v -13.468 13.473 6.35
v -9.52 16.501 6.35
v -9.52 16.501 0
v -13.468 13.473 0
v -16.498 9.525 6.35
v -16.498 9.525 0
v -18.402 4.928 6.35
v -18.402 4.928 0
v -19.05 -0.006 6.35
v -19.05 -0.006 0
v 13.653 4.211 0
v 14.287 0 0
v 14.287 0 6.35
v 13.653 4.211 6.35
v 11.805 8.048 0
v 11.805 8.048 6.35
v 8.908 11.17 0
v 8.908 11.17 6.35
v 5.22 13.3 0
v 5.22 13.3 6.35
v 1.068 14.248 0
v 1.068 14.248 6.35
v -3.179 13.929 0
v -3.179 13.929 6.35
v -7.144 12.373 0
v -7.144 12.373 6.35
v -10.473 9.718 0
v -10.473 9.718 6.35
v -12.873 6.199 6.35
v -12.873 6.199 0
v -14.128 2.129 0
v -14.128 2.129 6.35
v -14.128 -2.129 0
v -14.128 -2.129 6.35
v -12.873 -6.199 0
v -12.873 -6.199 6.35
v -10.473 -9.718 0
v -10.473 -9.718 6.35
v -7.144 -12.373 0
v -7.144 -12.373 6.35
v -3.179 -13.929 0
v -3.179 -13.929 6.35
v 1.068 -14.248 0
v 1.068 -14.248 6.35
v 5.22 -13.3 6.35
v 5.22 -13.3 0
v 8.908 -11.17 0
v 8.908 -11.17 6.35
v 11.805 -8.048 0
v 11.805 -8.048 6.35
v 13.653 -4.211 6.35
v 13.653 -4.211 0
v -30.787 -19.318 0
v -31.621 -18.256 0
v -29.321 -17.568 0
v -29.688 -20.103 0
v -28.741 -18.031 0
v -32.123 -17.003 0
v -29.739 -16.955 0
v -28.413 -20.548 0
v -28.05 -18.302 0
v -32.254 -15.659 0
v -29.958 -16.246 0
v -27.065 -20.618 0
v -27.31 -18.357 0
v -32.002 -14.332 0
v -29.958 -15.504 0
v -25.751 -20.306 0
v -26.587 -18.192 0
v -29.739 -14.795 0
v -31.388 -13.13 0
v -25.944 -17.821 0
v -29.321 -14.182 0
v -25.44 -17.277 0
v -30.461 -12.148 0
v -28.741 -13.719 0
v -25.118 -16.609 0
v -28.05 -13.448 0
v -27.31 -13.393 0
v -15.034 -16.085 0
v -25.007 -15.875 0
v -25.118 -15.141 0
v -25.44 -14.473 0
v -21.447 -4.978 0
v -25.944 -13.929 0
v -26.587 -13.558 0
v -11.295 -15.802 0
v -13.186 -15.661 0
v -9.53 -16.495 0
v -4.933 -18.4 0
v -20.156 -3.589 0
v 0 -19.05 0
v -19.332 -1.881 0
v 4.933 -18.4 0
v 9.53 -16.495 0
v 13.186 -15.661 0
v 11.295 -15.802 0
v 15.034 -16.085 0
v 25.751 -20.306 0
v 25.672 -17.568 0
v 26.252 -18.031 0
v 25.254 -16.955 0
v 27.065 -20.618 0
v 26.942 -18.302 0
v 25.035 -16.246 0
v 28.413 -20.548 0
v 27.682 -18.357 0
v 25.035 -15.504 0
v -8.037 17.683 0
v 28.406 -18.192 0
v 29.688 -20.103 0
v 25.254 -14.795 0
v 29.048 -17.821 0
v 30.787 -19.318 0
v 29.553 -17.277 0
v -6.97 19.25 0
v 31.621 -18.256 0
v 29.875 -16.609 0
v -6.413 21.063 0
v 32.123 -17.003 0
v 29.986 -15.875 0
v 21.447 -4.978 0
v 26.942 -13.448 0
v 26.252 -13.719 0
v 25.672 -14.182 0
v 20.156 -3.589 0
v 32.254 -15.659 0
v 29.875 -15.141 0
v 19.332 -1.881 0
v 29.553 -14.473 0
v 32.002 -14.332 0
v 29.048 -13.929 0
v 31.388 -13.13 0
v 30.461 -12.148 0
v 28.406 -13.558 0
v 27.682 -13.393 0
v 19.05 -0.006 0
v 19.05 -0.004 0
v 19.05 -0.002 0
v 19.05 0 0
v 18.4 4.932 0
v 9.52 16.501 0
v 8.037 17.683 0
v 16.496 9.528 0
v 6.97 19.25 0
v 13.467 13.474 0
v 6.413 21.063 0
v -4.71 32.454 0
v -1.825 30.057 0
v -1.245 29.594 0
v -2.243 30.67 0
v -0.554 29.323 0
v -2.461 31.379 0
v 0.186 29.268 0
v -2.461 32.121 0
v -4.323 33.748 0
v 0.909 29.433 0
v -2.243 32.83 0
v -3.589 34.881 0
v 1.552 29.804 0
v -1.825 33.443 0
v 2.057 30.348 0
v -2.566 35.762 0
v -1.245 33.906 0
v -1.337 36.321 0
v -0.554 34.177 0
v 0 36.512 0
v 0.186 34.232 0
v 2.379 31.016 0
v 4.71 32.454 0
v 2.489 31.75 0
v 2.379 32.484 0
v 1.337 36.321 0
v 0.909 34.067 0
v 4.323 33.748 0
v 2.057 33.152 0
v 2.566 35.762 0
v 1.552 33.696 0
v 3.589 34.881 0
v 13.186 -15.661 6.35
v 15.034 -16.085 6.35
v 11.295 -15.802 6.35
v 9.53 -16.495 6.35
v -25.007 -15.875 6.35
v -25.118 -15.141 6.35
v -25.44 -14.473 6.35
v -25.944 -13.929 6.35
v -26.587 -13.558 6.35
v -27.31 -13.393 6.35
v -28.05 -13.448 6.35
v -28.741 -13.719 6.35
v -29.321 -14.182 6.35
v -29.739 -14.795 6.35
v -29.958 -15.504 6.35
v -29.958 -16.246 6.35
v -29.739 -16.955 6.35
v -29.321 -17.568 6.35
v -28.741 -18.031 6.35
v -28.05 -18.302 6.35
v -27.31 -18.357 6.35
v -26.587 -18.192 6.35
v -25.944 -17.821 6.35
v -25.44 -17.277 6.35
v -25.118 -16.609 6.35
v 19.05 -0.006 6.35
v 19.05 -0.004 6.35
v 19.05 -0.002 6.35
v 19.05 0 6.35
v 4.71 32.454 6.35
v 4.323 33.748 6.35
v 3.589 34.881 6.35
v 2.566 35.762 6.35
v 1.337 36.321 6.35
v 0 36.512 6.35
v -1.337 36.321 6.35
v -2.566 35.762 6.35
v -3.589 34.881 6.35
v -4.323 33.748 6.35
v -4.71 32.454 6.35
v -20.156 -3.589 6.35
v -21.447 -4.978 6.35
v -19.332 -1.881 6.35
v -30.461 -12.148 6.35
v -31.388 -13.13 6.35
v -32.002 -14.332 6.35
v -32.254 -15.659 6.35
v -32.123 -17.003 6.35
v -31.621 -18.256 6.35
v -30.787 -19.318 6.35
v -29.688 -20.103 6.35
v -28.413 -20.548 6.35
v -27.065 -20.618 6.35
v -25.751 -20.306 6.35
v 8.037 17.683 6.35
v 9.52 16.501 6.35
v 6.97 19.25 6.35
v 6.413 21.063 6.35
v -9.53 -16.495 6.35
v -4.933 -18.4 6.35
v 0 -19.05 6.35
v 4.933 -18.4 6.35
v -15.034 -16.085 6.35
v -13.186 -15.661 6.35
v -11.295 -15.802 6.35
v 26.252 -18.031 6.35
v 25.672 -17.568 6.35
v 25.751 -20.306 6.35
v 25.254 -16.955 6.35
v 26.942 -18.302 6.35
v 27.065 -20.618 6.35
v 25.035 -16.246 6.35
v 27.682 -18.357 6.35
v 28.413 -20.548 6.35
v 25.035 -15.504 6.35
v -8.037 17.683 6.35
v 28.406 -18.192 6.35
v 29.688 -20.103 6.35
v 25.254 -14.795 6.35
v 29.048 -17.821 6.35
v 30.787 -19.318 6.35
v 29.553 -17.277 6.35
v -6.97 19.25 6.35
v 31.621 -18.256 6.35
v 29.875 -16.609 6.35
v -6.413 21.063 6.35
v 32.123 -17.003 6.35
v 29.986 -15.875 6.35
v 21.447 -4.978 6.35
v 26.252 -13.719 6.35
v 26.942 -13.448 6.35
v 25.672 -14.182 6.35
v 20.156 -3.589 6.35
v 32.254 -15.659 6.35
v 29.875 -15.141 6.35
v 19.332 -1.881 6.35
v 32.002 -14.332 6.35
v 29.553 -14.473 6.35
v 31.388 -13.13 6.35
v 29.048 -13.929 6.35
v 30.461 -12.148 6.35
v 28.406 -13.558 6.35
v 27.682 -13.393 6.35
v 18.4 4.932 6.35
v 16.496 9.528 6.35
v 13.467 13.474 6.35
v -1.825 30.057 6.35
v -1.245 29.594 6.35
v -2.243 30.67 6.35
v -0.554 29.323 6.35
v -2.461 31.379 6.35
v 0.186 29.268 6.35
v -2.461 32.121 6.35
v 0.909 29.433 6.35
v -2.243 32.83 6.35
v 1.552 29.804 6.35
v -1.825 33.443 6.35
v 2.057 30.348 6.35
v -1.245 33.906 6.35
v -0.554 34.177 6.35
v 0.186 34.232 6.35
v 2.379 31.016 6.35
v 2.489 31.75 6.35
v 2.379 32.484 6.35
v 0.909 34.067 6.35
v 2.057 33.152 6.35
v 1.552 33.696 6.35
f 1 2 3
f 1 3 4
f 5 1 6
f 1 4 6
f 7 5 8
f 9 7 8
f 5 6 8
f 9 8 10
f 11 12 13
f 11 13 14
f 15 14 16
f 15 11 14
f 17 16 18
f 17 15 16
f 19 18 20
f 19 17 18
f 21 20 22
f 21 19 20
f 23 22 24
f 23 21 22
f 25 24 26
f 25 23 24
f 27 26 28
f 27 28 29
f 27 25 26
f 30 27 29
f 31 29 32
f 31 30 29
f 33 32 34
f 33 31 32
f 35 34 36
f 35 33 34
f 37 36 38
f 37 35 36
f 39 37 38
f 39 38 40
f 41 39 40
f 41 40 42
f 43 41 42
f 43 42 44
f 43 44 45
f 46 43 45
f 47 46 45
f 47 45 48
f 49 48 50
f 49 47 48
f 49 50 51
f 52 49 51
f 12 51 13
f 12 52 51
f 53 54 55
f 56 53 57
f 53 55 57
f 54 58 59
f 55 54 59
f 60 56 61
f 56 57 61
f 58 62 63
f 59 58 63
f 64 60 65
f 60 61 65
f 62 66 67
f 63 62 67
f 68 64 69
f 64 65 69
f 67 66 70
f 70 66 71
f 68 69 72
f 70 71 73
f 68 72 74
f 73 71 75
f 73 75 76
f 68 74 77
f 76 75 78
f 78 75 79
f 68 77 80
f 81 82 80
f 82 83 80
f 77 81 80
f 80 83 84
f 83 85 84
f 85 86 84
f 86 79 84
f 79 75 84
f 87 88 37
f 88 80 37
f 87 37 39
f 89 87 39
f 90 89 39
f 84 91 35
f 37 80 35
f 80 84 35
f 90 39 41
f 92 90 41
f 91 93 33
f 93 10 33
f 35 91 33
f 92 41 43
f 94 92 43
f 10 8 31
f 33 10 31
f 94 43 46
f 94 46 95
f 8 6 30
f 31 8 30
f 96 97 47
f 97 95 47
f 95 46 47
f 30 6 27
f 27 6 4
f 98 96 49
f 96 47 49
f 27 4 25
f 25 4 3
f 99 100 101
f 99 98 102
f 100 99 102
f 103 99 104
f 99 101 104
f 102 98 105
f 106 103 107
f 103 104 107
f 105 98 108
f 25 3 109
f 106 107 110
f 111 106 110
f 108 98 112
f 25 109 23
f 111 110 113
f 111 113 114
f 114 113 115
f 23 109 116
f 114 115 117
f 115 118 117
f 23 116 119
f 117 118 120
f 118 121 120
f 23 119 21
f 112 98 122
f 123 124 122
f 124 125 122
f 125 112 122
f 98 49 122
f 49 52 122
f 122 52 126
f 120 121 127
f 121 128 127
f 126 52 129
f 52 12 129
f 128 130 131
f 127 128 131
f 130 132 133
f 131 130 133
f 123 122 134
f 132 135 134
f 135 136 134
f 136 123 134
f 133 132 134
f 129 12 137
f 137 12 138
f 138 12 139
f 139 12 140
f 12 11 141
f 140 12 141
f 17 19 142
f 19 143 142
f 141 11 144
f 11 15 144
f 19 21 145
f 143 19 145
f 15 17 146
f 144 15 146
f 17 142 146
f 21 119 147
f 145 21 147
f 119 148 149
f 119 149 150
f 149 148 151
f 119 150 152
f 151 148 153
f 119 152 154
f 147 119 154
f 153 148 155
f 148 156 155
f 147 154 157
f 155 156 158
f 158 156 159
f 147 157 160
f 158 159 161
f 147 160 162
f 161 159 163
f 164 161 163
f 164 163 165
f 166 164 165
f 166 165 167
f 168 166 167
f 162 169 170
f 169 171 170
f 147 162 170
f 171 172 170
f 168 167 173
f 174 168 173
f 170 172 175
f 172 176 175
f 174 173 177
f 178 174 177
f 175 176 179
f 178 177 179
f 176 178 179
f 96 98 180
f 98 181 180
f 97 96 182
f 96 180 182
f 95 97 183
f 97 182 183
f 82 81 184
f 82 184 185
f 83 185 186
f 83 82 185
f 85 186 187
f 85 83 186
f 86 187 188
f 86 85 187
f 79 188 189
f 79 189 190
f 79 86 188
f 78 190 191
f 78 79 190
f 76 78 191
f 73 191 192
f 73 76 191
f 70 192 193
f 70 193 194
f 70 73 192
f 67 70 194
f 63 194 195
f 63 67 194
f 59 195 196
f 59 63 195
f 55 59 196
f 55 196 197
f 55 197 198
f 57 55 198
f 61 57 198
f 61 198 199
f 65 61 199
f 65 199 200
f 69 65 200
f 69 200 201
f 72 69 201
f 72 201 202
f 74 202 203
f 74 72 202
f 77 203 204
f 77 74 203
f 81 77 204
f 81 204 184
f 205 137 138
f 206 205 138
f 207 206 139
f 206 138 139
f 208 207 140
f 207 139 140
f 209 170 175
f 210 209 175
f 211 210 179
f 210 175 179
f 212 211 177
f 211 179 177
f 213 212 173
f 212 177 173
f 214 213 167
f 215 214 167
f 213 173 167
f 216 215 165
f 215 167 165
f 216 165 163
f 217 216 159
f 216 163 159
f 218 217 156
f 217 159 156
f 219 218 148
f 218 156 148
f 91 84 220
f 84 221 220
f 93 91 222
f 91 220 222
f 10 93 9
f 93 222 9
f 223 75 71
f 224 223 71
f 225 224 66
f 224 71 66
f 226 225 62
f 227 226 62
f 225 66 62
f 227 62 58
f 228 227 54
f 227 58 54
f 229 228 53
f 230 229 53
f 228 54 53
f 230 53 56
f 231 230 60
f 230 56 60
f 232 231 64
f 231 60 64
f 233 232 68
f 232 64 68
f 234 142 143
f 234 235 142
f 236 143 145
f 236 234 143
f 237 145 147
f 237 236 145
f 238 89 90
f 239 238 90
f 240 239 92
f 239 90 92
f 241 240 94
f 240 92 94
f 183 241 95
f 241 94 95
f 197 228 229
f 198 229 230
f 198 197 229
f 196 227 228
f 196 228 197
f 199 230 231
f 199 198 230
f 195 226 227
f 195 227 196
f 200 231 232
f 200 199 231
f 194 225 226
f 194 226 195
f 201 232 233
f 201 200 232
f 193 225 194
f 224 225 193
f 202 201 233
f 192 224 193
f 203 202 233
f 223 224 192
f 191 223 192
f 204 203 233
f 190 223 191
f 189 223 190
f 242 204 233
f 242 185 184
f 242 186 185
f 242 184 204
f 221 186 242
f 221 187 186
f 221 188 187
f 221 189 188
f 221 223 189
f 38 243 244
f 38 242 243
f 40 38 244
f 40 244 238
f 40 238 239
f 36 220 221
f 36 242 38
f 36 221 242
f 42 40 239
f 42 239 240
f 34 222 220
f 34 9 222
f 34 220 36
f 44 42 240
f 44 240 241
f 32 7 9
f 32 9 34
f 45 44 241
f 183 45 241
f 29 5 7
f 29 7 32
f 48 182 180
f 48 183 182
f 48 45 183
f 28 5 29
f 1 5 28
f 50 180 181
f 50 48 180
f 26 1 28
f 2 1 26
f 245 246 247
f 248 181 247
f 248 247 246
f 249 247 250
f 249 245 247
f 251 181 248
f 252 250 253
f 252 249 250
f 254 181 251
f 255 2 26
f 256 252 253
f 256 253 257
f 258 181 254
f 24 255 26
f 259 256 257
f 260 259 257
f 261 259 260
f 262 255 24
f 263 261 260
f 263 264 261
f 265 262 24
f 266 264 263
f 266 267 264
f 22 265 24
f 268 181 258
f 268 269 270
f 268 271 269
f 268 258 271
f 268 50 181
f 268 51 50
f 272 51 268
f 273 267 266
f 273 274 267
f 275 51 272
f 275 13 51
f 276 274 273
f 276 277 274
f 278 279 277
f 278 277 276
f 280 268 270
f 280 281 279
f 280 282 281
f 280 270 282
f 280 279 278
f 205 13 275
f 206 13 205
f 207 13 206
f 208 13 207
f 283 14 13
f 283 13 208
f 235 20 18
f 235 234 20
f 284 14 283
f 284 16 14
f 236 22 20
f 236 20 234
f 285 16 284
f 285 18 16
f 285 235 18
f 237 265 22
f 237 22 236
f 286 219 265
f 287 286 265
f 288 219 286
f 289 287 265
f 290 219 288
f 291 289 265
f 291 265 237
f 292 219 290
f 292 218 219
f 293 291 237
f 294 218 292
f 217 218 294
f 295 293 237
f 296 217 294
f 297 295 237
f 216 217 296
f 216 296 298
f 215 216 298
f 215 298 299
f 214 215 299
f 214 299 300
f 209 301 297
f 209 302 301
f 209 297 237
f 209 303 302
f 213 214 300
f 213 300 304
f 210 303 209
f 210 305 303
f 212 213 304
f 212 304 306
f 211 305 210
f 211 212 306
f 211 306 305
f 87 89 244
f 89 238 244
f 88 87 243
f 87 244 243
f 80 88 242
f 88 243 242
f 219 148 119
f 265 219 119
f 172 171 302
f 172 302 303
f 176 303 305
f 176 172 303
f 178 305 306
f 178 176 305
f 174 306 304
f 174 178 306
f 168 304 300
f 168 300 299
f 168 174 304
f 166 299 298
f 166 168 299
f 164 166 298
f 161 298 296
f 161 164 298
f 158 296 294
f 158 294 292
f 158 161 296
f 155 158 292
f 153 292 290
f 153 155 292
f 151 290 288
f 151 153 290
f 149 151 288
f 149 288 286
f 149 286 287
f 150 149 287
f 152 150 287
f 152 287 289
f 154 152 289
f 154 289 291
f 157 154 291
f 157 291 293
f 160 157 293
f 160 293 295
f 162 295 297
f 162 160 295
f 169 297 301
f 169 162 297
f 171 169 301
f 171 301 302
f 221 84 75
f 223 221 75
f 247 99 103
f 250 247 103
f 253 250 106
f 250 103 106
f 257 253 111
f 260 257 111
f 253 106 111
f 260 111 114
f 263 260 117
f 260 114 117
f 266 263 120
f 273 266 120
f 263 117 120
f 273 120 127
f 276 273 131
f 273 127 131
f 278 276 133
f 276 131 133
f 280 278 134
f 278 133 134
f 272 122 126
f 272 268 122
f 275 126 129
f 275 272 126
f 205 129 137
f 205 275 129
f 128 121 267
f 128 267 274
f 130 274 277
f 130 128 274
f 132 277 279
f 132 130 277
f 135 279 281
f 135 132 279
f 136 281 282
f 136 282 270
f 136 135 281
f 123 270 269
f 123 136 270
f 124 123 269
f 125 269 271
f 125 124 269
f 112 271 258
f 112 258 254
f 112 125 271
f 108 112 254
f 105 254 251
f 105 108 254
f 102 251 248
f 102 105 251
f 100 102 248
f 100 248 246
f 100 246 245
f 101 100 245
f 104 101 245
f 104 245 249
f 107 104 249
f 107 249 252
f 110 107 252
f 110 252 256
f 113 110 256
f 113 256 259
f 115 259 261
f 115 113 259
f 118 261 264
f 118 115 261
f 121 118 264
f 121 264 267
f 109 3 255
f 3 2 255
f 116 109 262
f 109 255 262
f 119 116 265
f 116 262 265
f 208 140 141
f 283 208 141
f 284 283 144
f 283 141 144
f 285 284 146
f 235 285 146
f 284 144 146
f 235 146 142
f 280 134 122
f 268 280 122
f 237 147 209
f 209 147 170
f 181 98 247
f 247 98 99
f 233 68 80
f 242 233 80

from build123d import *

# Parameters (mm, degrees)
SKETCH2_R           = 19.05
SKETCH2_R_2         = 14.2875
SKETCH2_R_3         = 4.7625
SKETCH2_R_4         = 2.4892
BOSS_EXTRUDE1_DEPTH = 6.35
FILLET2_R           = 6.35


with BuildPart() as part:
    # Sketch2 → Boss-Extrude1 (new body)
    # profile 1 of 10: a face of its own
    with BuildSketch(Plane.XY):
        Circle(SKETCH2_R)
        Circle(SKETCH2_R_2, mode=Mode.SUBTRACT)
    # profile 2 of 10: a face of its own
    with BuildSketch(Plane.XY):
        with BuildLine():
            Line((30.461032527, -12.147828653), (18.828728894, -2.89507655))
            ThreePointArc((18.828728894, -2.89507655), (16.497783942, -9.525), (11.921574285, -14.858619268))
            Line((11.921574285, -14.858619268), (25.750844478, -20.306113668))
            ThreePointArc((25.750844478, -20.306113668), (23.371860585, -13.49375), (30.461032527, -12.147828653))
        make_face()
    # profile 3 of 10: a face of its own
    with BuildSketch(Plane.XY):
        with BuildLine():
            ThreePointArc((4.7625, 31.75), (-0.352941685, 27.000595993), (-4.710188049, 32.453942321))
            Line((-4.710188049, 32.453942321), (-6.907154609, 17.753695818))
            ThreePointArc((-6.907154609, 17.753695818), (0, 19.05), (6.907154609, 17.753695818))
            Line((6.907154609, 17.753695818), (4.710188049, 32.453942321))
            ThreePointArc((4.710188049, 32.453942321), (4.749404007, 32.102941685), (4.7625, 31.75))
        make_face()
    # profile 4 of 10: a face of its own
    with BuildSketch(Plane.XY):
        with BuildLine():
            ThreePointArc((-11.921574285, -14.858619268), (-16.497783942, -9.525), (-18.828728894, -2.89507655))
            Line((-18.828728894, -2.89507655), (-30.461032527, -12.147828653))
            ThreePointArc((-30.461032527, -12.147828653), (-25.427261032, -11.585424635), (-22.73380657, -15.875))
            ThreePointArc((-22.73380657, -15.875), (-23.55967289, -18.555358468), (-25.750844478, -20.306113668))
            Line((-25.750844478, -20.306113668), (-11.921574285, -14.858619268))
        make_face()
    # profile 5 of 10: a face of its own
    with BuildSketch(Plane.XY):
        with Locations((-27.49630657, -15.875)):
            Circle(SKETCH2_R_3)
        with Locations((-27.49630657, -15.875)):
            Circle(SKETCH2_R_4, mode=Mode.SUBTRACT)
    # profile 6 of 10: a face of its own
    with BuildSketch(Plane.XY):
        with Locations((27.49630657, -15.875)):
            Circle(SKETCH2_R_3)
        with Locations((27.49630657, -15.875)):
            Circle(SKETCH2_R_4, mode=Mode.SUBTRACT)
    # profile 7 of 10: a face of its own
    with BuildSketch(Plane.XY):
        with Locations((0, 31.75)):
            Circle(SKETCH2_R_3)
        with Locations((0, 31.75)):
            Circle(SKETCH2_R_4, mode=Mode.SUBTRACT)
    # profile 8 of 10: a face of its own
    with BuildSketch(Plane.XY):
        with BuildLine():
            ThreePointArc((6.907154609, 17.753695818), (0, 19.05), (-6.907154609, 17.753695818))
            ThreePointArc((-6.907154609, 17.753695818), (-16.497783942, 9.525), (-18.828728894, -2.89507655))
            ThreePointArc((-18.828728894, -2.89507655), (-16.497783942, -9.525), (-11.921574285, -14.858619268))
            ThreePointArc((-11.921574285, -14.858619268), (0, -19.05), (11.921574285, -14.858619268))
            ThreePointArc((11.921574285, -14.858619268), (16.497783942, -9.525), (18.828728894, -2.89507655))
            ThreePointArc((18.828728894, -2.89507655), (18.994601673, -1.451760064), (19.05, 0))
            ThreePointArc((19.05, 0), (15.723927552, 10.754561932), (6.907154609, 17.753695818))
        make_face()
        Circle(SKETCH2_R_2, mode=Mode.SUBTRACT)
    # profile 9 of 10: a face of its own
    with BuildSketch(Plane.XY):
        with BuildLine():
            ThreePointArc((6.907154609, 17.753695818), (0, 19.05), (-6.907154609, 17.753695818))
            ThreePointArc((-6.907154609, 17.753695818), (-16.497783942, 9.525), (-18.828728894, -2.89507655))
            ThreePointArc((-18.828728894, -2.89507655), (-16.497783942, -9.525), (-11.921574285, -14.858619268))
            ThreePointArc((-11.921574285, -14.858619268), (0, -19.05), (11.921574285, -14.858619268))
            ThreePointArc((11.921574285, -14.858619268), (16.497783942, -9.525), (18.828728894, -2.89507655))
            ThreePointArc((18.828728894, -2.89507655), (18.994601673, -1.451760064), (19.05, 0))
            ThreePointArc((19.05, 0), (15.723927552, 10.754561932), (6.907154609, 17.753695818))
        make_face()
        Circle(SKETCH2_R_2, mode=Mode.SUBTRACT)
    # profile 10 of 10: a face of its own
    with BuildSketch(Plane.XY):
        with BuildLine():
            ThreePointArc((6.907154609, 17.753695818), (0, 19.05), (-6.907154609, 17.753695818))
            ThreePointArc((-6.907154609, 17.753695818), (-16.497783942, 9.525), (-18.828728894, -2.89507655))
            ThreePointArc((-18.828728894, -2.89507655), (-16.497783942, -9.525), (-11.921574285, -14.858619268))
            ThreePointArc((-11.921574285, -14.858619268), (0, -19.05), (11.921574285, -14.858619268))
            ThreePointArc((11.921574285, -14.858619268), (16.497783942, -9.525), (18.828728894, -2.89507655))
            ThreePointArc((18.828728894, -2.89507655), (18.994601673, -1.451760064), (19.05, 0))
            ThreePointArc((19.05, 0), (15.723927552, 10.754561932), (6.907154609, 17.753695818))
        make_face()
        Circle(SKETCH2_R_2, mode=Mode.SUBTRACT)
    extrude(amount=BOSS_EXTRUDE1_DEPTH)

    # Fillet2
    fillet2_edges = [part.edges().sort_by_distance(p)[0] for p in [
        (18.828728894, -2.89507655, 3.175),
        (11.921574285, -14.858619268, 3.175),
        (-11.921574285, -14.858619268, 3.175),
        (-18.828728894, -2.89507655, 3.175),
        (-6.907154609, 17.753695818, 3.175),
        (6.907154609, 17.753695818, 3.175),
    ]]
    fillet(fillet2_edges, radius=FILLET2_R)


solid = part.part
